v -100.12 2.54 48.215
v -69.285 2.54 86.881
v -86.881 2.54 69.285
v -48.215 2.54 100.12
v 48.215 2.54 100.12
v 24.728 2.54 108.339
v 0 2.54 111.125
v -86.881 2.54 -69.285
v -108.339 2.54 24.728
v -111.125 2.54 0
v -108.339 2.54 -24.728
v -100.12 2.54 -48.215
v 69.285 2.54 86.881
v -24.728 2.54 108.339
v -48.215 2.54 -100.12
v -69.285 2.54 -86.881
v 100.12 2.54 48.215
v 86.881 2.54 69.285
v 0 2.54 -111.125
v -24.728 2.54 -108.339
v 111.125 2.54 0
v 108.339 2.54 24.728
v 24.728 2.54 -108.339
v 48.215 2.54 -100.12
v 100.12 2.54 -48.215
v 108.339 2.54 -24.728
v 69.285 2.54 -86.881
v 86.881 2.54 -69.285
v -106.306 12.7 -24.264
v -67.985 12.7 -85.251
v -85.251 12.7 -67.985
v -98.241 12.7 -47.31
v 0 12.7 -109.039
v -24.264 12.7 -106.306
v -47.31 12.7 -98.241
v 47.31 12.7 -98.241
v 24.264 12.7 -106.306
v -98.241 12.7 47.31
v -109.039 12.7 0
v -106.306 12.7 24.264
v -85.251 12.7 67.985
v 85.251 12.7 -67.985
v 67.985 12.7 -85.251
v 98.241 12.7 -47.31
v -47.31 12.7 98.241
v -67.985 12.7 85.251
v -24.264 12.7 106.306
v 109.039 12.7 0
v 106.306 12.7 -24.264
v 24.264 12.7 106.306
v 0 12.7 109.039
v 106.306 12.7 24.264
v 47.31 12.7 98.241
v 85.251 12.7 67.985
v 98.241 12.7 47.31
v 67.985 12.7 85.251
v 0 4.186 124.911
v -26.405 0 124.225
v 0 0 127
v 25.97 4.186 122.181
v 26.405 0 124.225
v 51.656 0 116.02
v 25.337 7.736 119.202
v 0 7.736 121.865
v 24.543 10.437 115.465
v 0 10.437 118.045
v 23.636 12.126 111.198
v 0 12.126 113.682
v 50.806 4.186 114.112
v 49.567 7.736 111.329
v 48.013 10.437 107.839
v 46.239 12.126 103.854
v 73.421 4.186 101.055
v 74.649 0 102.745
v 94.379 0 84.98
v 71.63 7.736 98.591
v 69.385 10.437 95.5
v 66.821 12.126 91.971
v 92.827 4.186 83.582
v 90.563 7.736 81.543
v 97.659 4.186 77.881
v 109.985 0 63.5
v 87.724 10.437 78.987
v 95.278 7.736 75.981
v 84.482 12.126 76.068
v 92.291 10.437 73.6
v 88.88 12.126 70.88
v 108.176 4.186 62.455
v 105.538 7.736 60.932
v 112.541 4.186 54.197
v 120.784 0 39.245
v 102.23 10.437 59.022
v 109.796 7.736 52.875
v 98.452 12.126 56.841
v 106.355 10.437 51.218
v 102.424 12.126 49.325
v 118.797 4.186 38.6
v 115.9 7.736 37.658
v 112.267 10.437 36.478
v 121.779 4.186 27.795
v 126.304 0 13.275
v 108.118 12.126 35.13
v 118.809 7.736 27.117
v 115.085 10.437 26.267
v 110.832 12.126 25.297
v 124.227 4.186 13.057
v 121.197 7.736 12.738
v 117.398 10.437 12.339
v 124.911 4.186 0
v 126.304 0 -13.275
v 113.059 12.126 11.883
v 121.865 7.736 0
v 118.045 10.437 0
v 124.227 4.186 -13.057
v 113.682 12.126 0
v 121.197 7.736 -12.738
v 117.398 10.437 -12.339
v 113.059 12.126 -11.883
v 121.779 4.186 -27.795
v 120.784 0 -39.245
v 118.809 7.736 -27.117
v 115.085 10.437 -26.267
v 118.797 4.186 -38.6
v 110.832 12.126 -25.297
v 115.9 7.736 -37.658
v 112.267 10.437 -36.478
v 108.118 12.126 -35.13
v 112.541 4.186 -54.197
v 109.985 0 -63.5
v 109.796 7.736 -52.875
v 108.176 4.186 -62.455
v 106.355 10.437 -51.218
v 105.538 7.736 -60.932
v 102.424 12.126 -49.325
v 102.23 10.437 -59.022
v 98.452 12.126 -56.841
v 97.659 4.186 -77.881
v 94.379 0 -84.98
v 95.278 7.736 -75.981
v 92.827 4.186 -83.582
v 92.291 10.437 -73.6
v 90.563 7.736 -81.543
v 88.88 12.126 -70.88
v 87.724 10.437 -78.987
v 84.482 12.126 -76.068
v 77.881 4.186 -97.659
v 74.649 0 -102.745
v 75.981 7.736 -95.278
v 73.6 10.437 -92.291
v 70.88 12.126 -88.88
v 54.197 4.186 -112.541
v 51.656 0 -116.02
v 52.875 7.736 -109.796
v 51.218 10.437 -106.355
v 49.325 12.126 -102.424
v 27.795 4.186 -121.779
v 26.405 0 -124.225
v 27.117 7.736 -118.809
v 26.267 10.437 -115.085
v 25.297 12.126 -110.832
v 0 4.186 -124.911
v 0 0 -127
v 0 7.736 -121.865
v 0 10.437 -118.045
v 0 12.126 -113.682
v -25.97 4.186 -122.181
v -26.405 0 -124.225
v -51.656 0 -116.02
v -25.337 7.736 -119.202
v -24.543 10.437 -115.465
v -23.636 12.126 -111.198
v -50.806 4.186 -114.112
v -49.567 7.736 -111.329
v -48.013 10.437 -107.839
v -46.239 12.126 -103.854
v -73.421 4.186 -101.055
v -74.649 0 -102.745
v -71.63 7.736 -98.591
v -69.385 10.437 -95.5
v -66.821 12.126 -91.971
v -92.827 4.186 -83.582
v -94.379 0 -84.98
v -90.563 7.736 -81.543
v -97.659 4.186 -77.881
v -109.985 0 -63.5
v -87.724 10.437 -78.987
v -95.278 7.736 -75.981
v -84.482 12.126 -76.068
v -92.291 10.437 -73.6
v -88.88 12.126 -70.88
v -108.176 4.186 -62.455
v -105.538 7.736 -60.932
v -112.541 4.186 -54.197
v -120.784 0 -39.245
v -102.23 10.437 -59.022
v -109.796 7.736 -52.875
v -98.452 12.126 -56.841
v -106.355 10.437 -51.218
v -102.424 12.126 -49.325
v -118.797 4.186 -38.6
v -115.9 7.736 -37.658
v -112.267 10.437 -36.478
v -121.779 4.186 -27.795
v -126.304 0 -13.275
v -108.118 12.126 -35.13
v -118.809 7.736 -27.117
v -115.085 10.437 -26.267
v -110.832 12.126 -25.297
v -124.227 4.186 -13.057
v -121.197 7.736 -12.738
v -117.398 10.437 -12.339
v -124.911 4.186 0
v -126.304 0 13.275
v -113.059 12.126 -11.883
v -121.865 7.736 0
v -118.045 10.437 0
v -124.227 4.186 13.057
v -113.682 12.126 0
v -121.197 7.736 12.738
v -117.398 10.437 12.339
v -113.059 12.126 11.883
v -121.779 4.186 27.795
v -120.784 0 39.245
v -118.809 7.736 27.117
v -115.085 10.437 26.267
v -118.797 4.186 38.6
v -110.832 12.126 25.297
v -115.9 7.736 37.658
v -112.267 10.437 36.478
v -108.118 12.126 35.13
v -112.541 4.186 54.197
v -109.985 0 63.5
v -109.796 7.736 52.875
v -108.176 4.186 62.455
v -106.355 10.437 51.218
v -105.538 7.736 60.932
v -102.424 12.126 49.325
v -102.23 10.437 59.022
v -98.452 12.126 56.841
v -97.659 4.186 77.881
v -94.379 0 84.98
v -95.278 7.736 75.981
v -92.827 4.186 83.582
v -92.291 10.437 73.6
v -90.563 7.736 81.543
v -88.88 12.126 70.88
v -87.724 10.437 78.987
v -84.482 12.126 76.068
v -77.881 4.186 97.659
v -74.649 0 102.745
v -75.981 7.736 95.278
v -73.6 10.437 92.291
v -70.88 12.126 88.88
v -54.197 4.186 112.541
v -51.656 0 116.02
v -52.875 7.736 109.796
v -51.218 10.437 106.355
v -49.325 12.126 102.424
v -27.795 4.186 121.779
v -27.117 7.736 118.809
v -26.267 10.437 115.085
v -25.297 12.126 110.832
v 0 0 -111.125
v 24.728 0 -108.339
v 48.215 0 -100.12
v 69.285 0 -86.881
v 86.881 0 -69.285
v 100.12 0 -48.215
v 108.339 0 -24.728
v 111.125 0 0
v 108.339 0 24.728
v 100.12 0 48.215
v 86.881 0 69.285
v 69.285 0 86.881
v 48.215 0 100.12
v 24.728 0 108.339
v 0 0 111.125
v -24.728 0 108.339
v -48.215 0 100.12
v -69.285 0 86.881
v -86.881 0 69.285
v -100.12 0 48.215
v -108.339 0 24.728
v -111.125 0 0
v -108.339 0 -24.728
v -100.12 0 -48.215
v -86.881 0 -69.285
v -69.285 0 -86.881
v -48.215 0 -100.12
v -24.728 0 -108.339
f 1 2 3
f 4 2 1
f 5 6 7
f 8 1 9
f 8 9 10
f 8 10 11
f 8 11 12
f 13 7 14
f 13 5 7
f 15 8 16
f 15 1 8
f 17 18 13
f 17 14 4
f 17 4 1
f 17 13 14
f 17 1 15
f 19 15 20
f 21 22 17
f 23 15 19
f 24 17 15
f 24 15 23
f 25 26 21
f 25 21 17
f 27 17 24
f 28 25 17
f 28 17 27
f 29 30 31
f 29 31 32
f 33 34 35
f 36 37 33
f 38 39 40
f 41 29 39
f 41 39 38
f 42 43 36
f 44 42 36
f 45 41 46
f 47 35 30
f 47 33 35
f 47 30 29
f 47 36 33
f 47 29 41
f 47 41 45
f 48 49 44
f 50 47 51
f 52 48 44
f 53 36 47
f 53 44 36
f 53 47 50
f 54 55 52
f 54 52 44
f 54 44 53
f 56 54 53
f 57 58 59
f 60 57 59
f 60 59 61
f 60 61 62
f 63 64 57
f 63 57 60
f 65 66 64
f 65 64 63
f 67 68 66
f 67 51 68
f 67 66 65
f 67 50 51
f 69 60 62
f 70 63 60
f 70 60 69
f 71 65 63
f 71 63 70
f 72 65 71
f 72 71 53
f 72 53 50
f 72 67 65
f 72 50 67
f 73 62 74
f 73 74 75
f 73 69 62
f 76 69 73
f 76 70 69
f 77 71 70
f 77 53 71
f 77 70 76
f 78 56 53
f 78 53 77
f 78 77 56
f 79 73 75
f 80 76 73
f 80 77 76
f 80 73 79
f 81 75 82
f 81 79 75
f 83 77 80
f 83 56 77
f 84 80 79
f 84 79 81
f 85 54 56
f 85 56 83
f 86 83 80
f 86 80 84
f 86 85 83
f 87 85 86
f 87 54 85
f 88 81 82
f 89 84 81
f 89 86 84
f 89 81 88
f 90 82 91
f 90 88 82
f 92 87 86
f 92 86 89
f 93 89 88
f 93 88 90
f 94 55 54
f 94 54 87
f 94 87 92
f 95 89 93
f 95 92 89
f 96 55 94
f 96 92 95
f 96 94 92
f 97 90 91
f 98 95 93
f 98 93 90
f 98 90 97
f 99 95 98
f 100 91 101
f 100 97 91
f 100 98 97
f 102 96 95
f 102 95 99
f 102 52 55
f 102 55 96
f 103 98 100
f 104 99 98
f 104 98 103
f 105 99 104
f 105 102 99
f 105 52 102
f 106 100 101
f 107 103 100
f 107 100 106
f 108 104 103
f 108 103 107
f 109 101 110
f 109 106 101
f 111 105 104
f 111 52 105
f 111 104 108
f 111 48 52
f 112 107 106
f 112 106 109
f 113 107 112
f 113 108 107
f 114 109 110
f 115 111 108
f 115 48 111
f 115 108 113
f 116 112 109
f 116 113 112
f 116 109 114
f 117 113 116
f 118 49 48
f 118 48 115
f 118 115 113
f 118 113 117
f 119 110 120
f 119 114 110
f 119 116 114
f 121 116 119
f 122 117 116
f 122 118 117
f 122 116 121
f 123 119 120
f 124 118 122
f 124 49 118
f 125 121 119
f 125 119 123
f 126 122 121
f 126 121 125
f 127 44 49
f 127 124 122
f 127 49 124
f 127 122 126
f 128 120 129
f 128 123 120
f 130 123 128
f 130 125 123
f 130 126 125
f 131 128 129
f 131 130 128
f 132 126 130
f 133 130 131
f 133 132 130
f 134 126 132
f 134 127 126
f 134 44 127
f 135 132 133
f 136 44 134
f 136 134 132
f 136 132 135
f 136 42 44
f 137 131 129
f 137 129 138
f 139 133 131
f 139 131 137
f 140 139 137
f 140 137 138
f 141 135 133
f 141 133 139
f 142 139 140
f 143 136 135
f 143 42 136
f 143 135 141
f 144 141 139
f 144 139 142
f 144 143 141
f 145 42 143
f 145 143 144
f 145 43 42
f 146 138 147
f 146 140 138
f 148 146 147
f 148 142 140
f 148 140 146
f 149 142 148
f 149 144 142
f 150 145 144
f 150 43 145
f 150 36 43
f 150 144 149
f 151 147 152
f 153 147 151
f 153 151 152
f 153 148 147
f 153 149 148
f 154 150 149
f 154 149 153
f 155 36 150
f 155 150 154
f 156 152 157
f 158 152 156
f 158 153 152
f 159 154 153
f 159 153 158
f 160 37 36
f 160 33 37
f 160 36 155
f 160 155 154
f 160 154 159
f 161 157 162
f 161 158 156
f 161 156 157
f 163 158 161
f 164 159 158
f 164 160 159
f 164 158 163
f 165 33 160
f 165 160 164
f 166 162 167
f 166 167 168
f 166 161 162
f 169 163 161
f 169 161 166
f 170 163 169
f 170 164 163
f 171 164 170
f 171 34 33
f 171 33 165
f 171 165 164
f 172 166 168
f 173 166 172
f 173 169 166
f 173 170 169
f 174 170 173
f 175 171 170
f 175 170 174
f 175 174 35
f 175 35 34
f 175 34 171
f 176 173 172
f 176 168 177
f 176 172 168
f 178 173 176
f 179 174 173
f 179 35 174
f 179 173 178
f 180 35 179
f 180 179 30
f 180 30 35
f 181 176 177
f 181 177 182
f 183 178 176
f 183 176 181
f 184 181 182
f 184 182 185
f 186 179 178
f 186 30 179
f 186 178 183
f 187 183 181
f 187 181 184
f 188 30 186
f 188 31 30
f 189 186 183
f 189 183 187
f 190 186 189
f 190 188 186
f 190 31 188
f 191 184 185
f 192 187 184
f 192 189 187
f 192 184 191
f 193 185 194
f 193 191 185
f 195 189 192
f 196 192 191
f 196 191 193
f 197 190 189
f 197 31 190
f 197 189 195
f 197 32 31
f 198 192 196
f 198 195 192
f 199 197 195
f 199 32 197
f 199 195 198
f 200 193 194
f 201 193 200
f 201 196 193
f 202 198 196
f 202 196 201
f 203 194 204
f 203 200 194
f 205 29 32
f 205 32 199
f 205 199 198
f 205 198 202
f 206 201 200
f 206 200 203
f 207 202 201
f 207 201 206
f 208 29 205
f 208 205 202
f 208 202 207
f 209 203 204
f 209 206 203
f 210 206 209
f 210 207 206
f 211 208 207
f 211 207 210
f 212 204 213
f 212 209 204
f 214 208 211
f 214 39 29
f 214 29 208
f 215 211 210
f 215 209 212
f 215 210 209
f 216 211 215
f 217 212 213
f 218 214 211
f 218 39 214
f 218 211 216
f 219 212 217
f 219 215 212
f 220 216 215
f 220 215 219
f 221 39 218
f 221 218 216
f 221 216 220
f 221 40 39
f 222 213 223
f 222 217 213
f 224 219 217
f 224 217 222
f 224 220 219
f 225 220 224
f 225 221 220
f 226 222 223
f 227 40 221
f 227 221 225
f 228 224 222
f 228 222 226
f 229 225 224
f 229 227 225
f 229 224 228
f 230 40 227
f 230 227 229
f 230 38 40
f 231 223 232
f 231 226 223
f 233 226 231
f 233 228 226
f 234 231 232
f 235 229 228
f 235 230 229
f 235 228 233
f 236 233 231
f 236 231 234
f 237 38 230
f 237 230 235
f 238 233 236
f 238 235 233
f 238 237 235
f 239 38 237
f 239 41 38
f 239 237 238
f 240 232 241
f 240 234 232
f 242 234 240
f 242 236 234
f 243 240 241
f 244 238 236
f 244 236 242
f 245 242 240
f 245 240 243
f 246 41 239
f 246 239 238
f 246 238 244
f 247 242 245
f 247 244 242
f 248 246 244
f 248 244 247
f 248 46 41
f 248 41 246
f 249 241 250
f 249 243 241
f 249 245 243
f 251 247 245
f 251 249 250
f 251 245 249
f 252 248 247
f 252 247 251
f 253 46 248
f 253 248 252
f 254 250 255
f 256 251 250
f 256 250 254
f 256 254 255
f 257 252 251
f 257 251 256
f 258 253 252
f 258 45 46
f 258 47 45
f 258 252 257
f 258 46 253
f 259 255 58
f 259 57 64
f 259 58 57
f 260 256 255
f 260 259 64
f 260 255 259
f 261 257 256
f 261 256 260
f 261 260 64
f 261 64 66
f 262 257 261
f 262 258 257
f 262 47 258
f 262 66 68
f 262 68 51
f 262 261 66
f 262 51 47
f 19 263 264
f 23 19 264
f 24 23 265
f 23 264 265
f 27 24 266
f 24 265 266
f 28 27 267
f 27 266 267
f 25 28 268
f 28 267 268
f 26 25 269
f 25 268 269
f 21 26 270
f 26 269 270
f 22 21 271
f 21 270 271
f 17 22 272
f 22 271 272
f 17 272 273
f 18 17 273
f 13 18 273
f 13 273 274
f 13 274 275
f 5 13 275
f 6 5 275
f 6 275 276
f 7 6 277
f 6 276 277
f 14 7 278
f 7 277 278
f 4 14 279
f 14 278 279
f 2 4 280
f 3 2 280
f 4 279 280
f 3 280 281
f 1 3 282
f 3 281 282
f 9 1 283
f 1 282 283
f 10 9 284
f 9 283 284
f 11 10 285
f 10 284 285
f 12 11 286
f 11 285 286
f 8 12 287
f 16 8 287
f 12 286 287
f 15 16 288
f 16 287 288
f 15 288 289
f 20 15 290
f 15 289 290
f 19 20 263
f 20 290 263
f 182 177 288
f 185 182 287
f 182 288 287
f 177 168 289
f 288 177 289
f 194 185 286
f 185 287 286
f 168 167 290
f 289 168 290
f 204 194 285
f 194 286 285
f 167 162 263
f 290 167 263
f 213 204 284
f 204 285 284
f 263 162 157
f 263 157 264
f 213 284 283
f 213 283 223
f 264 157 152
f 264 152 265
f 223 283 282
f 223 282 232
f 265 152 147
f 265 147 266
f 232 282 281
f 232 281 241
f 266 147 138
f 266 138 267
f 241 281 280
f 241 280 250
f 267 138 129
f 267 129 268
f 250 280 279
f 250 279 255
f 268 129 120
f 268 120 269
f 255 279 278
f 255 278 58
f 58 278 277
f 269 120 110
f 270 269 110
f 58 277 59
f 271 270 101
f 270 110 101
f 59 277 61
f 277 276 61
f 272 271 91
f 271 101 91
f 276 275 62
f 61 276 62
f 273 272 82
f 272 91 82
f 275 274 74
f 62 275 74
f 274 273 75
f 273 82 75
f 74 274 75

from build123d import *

# Parameters (mm, degrees)
SKETCH2_R           = 127
BOSS_EXTRUDE1_DEPTH = 12.7
FILLET1_R           = 19.05
SKETCH3_R           = 111.125
CUT_EXTRUDE1_DEPTH  = 2.54


with BuildPart() as part:
    # Sketch2 → Boss-Extrude1 (new body)
    with BuildSketch(Plane(origin=(0, 0, 0), x_dir=(1, 0, 0), z_dir=(0, 1, 0))):
        with Locations(Location((0, 0, 0), (0, 0, 270))):
            Circle(SKETCH2_R)
    extrude(amount=BOSS_EXTRUDE1_DEPTH)

    # Fillet1
    # the kernel refuses this fillet: 19.05 mm, written as the material it takes off along each edge
    with BuildSketch(Plane(origin=(0, 12.7, 0), x_dir=(0, 0, 1), z_dir=(-1, 0, 0))) as fillet1_piece_1:
        with BuildLine():
            CenterArc((109.039487758, -19.05), FILLET1_R, 19.471220634, 70.528779366)
            Line((109.039487758, 0), (109.039487758, 0.381))
            Line((109.039487758, 0.381), (127, 0.381))
            Line((127, 0.381), (127.381, 0))
            ThreePointArc((127.381, 0), (127.381, -6.35), (127.359210245, -12.573))
            Line((127.359210245, -12.573), (127, -12.7))
        make_face()
    revolve(axis=Axis((0, 12.7, 0), (0, 1, 0)), mode=Mode.SUBTRACT)

    # Sketch3 → Cut-Extrude1 (cut)
    with BuildSketch(Plane.XZ):
        with Locations(Location((0, 0, 0), (0, 0, 270))):
            Circle(SKETCH3_R)
    extrude(amount=-CUT_EXTRUDE1_DEPTH, mode=Mode.SUBTRACT)


solid = part.part
